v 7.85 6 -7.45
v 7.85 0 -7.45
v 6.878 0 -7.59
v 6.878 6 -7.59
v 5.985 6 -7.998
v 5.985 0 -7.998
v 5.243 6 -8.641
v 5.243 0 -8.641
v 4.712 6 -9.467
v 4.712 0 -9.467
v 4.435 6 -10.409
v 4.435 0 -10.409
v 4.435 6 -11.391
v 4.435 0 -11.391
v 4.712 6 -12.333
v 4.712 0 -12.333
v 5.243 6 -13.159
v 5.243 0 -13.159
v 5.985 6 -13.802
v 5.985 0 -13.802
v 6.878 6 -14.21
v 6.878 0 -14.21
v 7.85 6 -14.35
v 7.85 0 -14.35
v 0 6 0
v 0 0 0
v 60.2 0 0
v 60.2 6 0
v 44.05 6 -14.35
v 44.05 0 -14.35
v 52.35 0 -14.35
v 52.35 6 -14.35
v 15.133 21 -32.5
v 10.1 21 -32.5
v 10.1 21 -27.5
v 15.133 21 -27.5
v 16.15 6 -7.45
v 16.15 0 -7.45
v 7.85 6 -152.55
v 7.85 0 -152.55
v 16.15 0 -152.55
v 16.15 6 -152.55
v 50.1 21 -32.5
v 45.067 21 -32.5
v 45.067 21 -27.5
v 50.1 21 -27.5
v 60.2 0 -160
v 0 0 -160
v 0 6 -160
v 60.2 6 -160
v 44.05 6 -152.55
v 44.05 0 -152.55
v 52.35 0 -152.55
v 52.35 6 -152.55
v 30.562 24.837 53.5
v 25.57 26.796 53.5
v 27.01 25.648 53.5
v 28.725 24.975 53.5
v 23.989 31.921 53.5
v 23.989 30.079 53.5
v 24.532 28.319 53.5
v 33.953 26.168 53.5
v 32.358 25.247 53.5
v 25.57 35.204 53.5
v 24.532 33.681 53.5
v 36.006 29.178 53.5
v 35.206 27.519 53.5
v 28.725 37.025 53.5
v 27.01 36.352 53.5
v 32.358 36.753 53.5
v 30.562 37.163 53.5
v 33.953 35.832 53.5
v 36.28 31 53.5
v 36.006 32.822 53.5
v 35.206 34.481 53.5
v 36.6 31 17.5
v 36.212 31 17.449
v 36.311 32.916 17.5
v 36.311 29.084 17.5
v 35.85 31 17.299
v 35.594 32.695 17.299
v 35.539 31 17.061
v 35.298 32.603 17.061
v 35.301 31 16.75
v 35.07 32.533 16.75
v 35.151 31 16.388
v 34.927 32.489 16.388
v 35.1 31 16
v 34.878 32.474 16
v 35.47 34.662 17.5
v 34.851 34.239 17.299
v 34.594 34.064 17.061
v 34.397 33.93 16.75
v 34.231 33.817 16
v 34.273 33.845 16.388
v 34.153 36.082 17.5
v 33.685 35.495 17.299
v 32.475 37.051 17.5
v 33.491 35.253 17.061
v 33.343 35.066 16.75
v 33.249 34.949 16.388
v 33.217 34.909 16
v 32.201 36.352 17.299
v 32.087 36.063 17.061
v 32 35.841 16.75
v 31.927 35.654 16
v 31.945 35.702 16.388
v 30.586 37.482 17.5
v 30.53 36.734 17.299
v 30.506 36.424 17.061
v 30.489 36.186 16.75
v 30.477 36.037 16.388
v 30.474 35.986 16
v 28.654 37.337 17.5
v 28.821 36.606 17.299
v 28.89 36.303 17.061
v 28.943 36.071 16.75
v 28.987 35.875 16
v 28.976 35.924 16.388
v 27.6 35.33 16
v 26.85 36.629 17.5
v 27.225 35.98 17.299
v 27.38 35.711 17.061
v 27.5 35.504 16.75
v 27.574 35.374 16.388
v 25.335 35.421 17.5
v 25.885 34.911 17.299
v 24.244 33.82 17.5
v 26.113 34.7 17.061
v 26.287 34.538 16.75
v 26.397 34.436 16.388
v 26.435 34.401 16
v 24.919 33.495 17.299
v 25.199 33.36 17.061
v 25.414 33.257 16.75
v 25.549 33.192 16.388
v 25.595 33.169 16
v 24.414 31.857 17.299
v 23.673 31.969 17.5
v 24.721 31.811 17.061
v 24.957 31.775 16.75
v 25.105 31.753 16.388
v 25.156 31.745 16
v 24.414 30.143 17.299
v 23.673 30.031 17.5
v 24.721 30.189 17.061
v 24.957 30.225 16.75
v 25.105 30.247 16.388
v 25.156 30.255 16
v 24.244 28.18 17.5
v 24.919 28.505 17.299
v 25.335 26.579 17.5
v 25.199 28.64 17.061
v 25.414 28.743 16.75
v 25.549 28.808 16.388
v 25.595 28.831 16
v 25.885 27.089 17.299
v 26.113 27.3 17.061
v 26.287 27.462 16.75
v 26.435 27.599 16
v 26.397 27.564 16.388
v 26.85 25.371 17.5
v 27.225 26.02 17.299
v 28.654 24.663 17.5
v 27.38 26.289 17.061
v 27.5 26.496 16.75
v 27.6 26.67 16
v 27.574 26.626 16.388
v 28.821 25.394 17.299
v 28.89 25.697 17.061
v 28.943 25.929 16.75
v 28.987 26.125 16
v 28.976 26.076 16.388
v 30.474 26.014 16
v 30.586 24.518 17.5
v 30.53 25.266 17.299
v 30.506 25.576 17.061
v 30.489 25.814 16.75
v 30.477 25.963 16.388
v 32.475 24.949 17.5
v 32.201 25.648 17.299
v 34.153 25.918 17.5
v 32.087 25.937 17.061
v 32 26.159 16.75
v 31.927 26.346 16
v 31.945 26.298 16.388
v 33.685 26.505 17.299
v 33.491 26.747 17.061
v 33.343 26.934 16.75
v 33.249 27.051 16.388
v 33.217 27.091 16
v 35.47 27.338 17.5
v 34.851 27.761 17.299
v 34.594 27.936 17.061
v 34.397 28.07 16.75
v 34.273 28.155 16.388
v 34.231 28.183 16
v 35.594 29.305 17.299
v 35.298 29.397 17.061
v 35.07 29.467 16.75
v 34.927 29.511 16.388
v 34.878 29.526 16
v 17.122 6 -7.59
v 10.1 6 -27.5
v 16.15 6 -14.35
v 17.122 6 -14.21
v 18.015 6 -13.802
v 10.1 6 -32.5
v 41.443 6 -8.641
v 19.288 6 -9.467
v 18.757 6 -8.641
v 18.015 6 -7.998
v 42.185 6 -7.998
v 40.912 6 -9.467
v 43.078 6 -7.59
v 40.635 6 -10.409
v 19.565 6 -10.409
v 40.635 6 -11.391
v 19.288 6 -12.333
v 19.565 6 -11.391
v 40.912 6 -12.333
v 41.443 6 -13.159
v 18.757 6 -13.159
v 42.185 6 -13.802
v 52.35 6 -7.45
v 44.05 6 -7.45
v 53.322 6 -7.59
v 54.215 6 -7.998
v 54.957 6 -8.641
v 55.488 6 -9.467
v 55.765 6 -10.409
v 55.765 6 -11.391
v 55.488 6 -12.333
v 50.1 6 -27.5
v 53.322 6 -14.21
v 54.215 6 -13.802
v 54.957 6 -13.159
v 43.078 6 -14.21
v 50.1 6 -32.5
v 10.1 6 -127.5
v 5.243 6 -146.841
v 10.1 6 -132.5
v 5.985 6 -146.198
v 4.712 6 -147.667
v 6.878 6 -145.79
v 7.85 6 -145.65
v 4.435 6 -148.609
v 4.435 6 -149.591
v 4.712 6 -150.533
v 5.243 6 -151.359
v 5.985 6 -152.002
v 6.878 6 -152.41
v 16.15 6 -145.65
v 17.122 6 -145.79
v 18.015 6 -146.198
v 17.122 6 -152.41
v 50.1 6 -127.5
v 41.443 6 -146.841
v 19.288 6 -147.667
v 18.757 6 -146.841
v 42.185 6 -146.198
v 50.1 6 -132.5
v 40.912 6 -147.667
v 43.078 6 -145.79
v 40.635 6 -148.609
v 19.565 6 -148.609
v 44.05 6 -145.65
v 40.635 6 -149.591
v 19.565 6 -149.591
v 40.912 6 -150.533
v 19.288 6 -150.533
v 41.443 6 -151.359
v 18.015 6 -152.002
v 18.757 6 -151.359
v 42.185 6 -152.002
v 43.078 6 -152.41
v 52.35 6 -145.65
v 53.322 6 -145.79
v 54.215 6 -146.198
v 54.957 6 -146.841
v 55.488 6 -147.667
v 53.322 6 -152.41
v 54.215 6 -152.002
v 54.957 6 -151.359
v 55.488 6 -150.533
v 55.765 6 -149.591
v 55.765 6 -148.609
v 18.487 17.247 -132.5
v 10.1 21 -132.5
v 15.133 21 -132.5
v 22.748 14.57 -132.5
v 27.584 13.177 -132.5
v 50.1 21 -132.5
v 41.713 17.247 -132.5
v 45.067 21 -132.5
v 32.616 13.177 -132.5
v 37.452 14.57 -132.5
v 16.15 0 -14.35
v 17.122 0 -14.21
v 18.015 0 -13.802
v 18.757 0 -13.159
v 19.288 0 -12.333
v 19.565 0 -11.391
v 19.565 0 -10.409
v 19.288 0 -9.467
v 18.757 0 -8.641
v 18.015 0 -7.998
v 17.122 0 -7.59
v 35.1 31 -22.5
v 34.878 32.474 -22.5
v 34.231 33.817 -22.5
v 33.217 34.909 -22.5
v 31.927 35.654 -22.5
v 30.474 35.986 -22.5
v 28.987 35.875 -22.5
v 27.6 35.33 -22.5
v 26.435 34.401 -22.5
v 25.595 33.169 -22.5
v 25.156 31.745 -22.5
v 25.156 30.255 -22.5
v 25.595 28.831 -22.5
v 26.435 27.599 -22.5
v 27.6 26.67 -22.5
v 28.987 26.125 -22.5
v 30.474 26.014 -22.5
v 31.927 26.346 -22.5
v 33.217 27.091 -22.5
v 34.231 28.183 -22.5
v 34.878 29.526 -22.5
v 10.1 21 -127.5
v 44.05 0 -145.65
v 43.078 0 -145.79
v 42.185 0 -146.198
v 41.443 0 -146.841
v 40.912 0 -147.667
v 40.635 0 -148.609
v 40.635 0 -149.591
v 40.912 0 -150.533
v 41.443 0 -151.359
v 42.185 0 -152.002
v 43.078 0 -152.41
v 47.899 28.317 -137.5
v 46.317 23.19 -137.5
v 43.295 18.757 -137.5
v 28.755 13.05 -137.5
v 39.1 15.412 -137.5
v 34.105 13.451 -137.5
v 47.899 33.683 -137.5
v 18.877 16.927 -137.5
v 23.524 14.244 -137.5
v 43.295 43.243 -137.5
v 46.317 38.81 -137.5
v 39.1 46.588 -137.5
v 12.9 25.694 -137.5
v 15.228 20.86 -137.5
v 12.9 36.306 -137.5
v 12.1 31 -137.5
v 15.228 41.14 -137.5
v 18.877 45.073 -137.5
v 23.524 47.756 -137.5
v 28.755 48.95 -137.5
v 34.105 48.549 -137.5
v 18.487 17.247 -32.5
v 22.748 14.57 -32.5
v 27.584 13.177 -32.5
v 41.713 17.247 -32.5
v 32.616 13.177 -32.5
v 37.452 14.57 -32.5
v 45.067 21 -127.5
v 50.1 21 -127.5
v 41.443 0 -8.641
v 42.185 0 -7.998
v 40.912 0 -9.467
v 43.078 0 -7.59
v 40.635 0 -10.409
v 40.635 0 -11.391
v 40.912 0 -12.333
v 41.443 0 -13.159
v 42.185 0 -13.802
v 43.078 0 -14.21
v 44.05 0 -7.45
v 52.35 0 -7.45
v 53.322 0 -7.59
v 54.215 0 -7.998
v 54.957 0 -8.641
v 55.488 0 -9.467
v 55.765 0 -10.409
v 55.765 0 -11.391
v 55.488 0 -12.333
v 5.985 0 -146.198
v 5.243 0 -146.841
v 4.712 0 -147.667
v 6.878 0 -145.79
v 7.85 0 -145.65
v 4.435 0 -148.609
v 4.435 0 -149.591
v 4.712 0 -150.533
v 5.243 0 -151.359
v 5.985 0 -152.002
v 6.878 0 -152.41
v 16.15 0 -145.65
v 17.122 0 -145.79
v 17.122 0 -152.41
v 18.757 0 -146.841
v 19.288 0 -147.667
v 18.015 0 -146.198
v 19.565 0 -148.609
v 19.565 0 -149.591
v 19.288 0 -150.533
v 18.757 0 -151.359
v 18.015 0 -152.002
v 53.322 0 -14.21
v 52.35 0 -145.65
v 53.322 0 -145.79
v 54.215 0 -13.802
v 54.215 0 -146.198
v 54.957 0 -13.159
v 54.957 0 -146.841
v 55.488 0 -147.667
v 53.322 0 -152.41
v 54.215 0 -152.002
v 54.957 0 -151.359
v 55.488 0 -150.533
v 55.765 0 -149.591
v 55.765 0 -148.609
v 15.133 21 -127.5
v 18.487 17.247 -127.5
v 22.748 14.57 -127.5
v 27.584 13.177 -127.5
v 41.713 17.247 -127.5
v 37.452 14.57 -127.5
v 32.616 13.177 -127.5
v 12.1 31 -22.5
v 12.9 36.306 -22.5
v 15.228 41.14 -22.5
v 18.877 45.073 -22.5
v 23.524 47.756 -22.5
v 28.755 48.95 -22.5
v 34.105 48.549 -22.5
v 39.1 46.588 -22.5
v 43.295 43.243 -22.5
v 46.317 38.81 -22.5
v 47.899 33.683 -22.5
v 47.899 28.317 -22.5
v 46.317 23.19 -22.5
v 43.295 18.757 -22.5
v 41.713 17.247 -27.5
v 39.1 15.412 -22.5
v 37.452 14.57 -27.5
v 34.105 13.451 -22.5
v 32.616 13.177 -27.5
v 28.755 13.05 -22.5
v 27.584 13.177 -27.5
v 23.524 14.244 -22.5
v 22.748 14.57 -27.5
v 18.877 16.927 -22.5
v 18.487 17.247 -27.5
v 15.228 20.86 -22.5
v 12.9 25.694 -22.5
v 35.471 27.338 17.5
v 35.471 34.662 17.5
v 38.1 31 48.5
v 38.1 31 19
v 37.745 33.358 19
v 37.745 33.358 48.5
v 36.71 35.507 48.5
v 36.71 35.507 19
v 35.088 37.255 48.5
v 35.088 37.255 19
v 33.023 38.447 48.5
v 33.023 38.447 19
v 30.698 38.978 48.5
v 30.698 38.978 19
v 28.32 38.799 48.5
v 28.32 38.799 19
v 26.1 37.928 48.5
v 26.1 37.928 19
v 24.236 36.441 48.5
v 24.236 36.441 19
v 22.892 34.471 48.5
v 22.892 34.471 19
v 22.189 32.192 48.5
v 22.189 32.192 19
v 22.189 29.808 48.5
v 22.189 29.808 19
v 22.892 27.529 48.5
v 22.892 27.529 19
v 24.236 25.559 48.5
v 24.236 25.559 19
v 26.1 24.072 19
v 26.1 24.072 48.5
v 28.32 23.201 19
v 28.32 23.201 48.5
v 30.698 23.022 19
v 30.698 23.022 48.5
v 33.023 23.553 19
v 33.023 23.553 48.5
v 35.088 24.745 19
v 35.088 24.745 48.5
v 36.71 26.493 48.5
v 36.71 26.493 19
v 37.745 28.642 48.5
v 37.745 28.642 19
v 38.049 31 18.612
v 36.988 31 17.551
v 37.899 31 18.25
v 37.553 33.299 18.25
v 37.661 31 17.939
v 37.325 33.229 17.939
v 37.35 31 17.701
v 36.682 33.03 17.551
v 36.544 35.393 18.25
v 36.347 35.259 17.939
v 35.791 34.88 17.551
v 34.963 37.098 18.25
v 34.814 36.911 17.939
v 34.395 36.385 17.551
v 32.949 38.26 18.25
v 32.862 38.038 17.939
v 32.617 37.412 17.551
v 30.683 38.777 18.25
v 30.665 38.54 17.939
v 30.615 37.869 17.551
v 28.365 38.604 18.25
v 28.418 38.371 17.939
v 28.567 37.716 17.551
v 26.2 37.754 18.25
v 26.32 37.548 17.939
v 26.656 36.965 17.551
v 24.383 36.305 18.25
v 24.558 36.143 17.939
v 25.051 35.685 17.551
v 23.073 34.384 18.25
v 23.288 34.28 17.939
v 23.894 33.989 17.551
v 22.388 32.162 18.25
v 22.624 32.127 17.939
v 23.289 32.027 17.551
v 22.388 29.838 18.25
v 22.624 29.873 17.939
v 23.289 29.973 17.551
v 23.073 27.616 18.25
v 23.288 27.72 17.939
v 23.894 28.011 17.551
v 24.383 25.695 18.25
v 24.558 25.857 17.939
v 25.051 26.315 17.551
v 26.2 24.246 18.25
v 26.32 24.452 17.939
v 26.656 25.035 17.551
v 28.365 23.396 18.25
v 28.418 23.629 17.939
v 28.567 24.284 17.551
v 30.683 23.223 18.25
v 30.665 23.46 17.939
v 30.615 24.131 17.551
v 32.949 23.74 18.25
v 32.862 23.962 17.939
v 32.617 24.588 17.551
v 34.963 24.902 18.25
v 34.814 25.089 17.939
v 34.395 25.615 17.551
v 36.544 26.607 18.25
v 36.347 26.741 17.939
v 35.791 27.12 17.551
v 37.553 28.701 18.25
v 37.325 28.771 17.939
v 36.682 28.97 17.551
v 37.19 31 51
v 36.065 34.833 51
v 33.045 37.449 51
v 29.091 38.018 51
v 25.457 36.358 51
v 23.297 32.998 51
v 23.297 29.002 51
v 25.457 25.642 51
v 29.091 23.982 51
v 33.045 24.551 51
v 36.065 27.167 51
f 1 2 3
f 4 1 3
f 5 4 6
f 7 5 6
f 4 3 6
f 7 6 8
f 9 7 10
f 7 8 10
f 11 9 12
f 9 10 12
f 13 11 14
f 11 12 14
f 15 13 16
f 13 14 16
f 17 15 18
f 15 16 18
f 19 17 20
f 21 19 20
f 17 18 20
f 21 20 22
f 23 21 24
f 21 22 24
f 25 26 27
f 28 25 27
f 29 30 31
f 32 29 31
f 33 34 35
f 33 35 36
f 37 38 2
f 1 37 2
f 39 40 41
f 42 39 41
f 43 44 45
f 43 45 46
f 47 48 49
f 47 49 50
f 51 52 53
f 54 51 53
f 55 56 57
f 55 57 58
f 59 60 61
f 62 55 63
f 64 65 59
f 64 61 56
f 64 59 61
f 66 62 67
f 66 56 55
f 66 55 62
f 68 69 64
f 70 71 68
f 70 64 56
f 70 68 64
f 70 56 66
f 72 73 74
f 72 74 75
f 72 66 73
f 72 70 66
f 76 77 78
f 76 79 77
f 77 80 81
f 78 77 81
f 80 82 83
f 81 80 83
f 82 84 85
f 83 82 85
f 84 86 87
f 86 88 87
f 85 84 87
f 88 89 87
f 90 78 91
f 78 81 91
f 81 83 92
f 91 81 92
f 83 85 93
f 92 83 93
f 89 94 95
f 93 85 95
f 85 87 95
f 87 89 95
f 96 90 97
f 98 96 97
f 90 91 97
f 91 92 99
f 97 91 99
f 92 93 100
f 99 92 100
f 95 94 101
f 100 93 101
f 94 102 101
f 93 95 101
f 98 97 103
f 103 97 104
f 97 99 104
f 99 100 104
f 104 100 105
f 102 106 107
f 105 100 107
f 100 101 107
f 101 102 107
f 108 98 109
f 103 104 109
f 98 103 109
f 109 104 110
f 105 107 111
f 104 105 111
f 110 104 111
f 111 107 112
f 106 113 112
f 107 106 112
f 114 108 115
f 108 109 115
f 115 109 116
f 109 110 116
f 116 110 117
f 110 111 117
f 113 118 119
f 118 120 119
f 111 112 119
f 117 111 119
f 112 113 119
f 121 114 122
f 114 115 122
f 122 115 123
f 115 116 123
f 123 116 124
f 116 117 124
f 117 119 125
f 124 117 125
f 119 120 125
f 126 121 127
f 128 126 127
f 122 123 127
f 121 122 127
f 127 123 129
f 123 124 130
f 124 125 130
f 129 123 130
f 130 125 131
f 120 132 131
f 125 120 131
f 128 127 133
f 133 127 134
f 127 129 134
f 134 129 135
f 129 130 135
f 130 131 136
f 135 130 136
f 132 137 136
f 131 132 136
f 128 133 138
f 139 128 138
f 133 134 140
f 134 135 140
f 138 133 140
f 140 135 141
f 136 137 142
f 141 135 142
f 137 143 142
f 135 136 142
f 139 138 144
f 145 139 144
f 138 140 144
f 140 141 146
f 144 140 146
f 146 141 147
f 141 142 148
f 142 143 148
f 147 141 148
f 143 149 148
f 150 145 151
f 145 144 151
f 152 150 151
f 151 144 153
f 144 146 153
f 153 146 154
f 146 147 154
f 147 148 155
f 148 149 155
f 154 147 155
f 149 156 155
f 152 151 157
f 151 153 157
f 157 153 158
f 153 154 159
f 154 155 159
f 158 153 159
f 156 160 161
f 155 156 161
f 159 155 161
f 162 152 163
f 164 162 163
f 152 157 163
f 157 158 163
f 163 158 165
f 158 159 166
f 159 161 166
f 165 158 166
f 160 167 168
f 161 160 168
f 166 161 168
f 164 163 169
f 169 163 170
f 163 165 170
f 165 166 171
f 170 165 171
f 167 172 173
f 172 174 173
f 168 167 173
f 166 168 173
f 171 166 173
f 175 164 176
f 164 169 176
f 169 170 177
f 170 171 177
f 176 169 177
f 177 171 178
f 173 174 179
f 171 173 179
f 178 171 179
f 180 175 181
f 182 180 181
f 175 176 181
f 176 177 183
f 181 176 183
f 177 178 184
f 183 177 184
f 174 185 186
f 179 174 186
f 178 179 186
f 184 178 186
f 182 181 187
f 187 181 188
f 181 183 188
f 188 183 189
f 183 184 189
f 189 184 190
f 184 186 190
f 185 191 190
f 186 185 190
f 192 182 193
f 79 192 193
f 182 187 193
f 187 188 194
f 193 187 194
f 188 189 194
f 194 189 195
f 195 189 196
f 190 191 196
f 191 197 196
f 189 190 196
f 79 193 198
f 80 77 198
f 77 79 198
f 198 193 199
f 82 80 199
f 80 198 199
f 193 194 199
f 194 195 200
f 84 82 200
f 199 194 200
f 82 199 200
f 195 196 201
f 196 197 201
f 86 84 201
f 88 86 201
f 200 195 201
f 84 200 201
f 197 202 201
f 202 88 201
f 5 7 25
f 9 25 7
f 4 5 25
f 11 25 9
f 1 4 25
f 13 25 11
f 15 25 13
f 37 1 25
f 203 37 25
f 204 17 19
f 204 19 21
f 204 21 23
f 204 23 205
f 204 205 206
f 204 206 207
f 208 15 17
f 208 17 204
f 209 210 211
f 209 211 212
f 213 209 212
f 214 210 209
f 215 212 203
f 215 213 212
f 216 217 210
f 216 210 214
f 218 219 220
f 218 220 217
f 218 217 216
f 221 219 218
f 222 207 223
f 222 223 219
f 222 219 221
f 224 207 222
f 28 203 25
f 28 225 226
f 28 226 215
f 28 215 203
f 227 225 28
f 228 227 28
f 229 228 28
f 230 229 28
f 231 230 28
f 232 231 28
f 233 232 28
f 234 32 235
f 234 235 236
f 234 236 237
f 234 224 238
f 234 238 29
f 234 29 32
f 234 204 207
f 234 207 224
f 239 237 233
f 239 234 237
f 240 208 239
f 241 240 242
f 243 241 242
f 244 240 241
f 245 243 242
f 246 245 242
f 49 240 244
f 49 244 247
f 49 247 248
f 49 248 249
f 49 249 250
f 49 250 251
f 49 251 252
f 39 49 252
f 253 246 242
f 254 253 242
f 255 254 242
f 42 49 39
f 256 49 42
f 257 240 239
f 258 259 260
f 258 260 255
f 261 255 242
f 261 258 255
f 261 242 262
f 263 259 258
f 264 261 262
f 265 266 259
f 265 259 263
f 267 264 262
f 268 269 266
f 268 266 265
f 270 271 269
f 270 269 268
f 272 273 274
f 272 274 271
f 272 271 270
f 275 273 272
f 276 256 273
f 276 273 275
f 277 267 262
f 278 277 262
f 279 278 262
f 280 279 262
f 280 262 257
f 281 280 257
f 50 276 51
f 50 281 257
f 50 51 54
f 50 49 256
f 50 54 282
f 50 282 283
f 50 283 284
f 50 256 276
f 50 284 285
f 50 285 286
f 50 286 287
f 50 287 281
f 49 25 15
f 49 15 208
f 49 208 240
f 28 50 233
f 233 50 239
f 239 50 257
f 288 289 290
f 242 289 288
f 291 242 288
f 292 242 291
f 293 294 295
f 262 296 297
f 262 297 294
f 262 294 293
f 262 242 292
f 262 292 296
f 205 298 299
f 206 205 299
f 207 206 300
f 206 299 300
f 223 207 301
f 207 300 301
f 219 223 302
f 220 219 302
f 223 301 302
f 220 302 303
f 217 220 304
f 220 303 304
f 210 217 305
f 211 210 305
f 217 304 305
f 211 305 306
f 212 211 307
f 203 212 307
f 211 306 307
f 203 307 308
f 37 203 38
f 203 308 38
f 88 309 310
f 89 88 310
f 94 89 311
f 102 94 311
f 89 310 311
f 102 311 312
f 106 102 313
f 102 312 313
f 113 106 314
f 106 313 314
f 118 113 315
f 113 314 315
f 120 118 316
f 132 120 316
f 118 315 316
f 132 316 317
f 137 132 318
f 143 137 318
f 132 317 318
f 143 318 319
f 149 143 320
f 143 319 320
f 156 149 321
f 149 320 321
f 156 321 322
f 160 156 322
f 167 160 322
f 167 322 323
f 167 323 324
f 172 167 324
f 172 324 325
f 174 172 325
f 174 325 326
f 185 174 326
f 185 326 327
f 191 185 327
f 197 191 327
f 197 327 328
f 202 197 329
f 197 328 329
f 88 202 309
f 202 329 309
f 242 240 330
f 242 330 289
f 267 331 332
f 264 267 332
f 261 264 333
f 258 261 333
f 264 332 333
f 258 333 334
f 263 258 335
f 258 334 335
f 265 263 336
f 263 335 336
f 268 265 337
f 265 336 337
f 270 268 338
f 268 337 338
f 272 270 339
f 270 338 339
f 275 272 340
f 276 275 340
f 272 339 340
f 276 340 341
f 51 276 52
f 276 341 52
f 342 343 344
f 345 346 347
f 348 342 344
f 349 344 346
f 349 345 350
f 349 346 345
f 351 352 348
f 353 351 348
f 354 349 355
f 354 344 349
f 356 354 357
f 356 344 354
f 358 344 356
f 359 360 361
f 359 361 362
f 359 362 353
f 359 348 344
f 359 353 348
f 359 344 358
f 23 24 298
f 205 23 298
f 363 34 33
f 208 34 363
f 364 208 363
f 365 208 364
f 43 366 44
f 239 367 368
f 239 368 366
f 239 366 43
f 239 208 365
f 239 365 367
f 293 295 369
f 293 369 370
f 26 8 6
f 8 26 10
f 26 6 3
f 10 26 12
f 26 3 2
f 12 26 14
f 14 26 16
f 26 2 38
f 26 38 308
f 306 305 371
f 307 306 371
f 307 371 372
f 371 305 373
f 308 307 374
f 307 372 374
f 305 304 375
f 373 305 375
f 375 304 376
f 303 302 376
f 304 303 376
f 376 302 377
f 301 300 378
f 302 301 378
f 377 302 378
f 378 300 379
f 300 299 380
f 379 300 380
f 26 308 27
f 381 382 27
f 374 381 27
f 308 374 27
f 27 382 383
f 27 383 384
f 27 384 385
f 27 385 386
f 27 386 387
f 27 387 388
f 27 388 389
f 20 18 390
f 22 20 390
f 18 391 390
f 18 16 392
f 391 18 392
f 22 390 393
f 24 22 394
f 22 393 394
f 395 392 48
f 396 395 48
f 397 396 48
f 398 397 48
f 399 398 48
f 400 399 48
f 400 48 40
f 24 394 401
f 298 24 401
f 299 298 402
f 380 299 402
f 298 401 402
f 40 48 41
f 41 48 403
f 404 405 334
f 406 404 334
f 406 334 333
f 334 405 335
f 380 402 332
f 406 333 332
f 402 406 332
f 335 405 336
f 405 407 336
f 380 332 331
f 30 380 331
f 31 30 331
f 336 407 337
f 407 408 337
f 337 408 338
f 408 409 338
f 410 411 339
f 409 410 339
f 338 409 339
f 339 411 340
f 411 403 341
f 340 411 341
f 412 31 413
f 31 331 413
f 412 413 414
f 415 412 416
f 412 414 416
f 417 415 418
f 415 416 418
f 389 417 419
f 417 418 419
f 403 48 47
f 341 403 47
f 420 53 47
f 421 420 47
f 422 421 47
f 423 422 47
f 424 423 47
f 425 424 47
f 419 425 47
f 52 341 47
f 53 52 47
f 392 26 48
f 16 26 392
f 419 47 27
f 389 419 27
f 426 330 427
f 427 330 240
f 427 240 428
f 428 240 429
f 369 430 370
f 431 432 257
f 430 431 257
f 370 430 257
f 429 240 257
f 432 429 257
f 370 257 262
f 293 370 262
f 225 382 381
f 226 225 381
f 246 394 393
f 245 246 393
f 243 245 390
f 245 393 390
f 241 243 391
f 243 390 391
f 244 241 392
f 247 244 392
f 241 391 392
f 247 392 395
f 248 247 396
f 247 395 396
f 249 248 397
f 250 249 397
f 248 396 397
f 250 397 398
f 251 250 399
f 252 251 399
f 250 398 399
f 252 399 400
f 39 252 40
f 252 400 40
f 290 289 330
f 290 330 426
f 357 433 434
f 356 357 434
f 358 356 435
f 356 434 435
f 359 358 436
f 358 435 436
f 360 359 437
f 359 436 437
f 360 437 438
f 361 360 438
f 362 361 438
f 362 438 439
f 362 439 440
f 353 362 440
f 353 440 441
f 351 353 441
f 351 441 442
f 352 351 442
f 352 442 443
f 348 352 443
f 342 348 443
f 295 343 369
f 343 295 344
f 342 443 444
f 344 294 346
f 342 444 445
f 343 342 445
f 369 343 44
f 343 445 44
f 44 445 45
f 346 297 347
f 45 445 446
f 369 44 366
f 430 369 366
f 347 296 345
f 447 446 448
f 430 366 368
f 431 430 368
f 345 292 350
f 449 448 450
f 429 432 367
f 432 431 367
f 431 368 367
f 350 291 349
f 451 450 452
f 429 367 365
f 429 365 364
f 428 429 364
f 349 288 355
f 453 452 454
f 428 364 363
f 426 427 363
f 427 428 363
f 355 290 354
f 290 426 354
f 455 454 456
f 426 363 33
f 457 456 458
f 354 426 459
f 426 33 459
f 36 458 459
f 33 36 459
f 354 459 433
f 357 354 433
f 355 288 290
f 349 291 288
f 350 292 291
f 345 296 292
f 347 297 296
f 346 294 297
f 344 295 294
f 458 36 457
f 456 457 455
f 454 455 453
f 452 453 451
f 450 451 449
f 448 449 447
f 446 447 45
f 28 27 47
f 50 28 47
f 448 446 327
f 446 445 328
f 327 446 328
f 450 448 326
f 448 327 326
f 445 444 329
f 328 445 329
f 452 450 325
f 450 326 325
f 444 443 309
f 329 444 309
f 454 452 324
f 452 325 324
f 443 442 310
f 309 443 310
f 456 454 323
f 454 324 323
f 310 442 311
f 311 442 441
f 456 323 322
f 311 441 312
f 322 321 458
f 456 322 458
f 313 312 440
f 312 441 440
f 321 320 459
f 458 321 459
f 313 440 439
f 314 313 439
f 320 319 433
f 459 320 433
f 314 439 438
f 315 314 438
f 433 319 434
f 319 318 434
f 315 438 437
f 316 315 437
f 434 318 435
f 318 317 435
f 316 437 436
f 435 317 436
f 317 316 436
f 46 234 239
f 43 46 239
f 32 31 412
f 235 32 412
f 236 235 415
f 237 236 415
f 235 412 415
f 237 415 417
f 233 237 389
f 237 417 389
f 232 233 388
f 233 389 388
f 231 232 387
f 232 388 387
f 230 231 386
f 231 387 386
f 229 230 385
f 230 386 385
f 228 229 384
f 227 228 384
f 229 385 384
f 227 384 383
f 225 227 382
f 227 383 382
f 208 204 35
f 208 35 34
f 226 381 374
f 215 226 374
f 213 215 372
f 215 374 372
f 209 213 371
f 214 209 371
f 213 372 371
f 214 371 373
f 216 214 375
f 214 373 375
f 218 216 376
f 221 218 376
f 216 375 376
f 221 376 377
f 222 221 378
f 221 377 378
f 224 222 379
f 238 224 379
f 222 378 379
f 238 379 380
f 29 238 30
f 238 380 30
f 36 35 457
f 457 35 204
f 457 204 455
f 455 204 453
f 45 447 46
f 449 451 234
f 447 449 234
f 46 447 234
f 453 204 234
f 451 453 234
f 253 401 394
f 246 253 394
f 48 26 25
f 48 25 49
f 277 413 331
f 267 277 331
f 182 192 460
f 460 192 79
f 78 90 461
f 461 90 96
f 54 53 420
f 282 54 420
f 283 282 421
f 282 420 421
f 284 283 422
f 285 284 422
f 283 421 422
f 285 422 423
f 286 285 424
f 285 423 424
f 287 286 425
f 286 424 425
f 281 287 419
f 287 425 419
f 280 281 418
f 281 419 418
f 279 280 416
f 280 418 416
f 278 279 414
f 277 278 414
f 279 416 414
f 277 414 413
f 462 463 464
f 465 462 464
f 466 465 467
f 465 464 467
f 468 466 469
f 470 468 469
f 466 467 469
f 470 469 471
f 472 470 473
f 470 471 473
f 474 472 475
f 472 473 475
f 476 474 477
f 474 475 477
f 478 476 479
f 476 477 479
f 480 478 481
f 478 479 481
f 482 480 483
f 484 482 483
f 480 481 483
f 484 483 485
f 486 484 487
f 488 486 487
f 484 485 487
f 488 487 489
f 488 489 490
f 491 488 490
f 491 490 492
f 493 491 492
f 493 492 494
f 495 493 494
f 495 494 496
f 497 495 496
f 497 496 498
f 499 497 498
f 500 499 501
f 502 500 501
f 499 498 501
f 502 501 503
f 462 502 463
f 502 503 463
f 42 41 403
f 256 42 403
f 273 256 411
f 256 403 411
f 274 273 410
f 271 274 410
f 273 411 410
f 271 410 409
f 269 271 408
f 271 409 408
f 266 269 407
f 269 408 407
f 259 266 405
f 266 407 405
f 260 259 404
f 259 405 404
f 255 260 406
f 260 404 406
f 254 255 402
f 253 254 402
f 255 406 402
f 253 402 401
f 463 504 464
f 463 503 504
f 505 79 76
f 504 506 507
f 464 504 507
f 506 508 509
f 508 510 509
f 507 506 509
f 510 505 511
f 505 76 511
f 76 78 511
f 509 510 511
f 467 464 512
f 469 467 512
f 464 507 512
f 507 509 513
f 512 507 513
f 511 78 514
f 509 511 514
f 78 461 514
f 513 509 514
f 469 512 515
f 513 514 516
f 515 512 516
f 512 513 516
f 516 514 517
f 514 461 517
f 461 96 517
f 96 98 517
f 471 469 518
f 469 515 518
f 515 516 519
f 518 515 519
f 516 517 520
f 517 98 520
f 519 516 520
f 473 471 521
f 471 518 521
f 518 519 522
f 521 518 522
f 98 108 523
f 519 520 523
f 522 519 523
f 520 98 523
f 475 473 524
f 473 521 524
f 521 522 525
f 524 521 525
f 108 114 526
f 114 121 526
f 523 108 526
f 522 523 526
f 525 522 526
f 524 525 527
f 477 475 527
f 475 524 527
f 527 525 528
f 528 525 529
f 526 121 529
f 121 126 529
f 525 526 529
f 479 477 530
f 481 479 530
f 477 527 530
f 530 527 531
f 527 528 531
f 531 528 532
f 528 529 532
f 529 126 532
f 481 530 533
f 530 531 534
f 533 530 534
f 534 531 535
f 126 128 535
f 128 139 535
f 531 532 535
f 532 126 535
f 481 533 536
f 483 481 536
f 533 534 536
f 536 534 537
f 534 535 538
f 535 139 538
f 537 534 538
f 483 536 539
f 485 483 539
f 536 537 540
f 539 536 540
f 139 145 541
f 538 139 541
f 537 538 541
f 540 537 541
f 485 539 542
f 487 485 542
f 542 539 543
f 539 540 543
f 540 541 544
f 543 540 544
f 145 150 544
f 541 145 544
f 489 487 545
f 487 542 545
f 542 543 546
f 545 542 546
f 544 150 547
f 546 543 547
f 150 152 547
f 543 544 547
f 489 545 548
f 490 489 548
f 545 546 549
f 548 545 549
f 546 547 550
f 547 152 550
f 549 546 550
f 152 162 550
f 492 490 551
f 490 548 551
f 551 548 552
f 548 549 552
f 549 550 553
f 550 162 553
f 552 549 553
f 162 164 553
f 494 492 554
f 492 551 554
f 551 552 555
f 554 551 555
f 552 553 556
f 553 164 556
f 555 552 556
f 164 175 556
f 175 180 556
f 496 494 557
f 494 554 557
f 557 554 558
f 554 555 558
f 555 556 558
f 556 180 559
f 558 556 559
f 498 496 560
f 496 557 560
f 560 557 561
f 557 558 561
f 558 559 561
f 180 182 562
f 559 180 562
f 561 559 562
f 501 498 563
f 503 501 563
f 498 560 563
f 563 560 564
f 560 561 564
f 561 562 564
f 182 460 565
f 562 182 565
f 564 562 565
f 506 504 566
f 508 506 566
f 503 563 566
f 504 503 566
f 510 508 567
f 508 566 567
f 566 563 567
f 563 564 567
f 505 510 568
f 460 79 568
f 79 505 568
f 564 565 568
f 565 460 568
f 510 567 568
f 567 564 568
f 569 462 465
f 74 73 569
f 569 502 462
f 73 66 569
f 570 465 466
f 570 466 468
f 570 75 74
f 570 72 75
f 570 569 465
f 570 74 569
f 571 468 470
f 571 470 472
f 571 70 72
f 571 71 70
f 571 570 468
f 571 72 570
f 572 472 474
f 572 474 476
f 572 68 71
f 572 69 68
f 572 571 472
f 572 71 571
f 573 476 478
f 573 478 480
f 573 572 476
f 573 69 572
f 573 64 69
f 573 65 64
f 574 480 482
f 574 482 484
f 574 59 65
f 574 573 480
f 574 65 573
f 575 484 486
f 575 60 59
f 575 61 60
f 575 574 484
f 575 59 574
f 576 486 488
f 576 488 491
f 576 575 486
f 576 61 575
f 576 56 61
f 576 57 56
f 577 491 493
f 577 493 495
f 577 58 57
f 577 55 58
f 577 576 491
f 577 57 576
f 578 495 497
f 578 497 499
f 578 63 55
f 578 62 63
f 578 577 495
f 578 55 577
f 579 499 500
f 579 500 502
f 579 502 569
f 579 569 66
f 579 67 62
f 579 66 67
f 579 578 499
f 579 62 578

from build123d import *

# Parameters (mm, degrees)
SKETCH1_W                = 60.2
SKETCH1_H                = 160
BOSS_EXTRUDE1_DEPTH      = 6
SKETCH3_W                = 40
SKETCH3_H                = 5
BOSS_EXTRUDE2_DEPTH      = 15
BOSS_EXTRUDE3_DEPTH      = 5
BOSS_EXTRUDE3_DEPTH_BACK = 110
SKETCH4_R                = 18
SKETCH5_R                = 5
BOSS_EXTRUDE4_DEPTH      = 40
SKETCH6_R                = 8
BOSS_EXTRUDE5_DEPTH      = 36
CHAMFER1_SIZE            = 5
CHAMFER1_SIZE2           = 1.819851171
FILLET1_R                = 1.5


with BuildPart() as part:
    # Sketch1 → Boss-Extrude1 (new body)
    with BuildSketch(Plane(origin=(0, 0, 0), x_dir=(1, 0, 0), z_dir=(0, 1, 0))):
        with Locations((30.1, 80)):
            Rectangle(SKETCH1_W, SKETCH1_H)
        with BuildLine():
            Line((7.85, 152.55), (16.15, 152.55))
            ThreePointArc((16.15, 152.55), (19.6, 149.1), (16.15, 145.65))
            Line((16.15, 145.65), (7.85, 145.65))
            ThreePointArc((7.85, 145.65), (4.4, 149.1), (7.85, 152.55))
        make_face(mode=Mode.SUBTRACT)
        with BuildLine():
            Line((52.35, 145.65), (44.05, 145.65))
            ThreePointArc((44.05, 145.65), (40.6, 149.1), (44.05, 152.55))
            Line((44.05, 152.55), (52.35, 152.55))
            ThreePointArc((52.35, 152.55), (55.8, 149.1), (52.35, 145.65))
        make_face(mode=Mode.SUBTRACT)
        with BuildLine():
            Line((52.35, 7.45), (44.05, 7.45))
            ThreePointArc((44.05, 7.45), (40.6, 10.9), (44.05, 14.35))
            Line((44.05, 14.35), (52.35, 14.35))
            ThreePointArc((52.35, 14.35), (55.8, 10.9), (52.35, 7.45))
        make_face(mode=Mode.SUBTRACT)
        with BuildLine():
            Line((7.85, 14.35), (16.15, 14.35))
            ThreePointArc((16.15, 14.35), (19.6, 10.9), (16.15, 7.45))
            Line((16.15, 7.45), (7.85, 7.45))
            ThreePointArc((7.85, 7.45), (4.4, 10.9), (7.85, 14.35))
        make_face(mode=Mode.SUBTRACT)
    extrude(amount=BOSS_EXTRUDE1_DEPTH)

    # Sketch3 → Boss-Extrude2 (add)
    with BuildSketch(Plane(origin=(0, 6, 0), x_dir=(1, 0, 0), z_dir=(0, 1, 0))):
        with Locations((30.1, 130)):
            Rectangle(SKETCH3_W, SKETCH3_H)
        with Locations((30.1, 30)):
            Rectangle(SKETCH3_W, SKETCH3_H)
    extrude(amount=BOSS_EXTRUDE2_DEPTH)

    # Sketch4 → Boss-Extrude3 (add, two sides: drawn at the far end of the back side and taken through both)
    with BuildSketch(Plane(origin=(0, 0, -132.5), x_dir=(-1, 0, 0), z_dir=(0, 0, -1)).offset(-BOSS_EXTRUDE3_DEPTH_BACK)):
        with Locations((-30.1, 31)):
            Circle(SKETCH4_R)
    extrude(amount=BOSS_EXTRUDE3_DEPTH + BOSS_EXTRUDE3_DEPTH_BACK)

    # Sketch5 → Boss-Extrude4 (add)
    with BuildSketch(Plane.XY.offset(-22.5)):
        with Locations((30.1, 31)):
            Circle(SKETCH5_R)
    extrude(amount=BOSS_EXTRUDE4_DEPTH)

    # Sketch6 → Boss-Extrude5 (add)
    with BuildSketch(Plane.XY.offset(17.5)):
        with Locations((30.1, 31)):
            Circle(SKETCH6_R)
    extrude(amount=BOSS_EXTRUDE5_DEPTH)

    # Chamfer1
    chamfer1_edges = [part.edges().sort_by_distance(p)[0] for p in [
        (22.1, 31, 53.5),
    ]]
    chamfer1_side = [part.faces().sort_by_distance(p)[0] for p in [
        (22.1, 31, 35.5),
    ]]
    chamfer(chamfer1_edges, length=CHAMFER1_SIZE, length2=CHAMFER1_SIZE2, reference=chamfer1_side[0])

    # Fillet1
    fillet1_edges = [part.edges().sort_by_distance(p)[0] for p in [
        (25.1, 31, 17.5),
        (22.1, 31, 17.5),
    ]]
    fillet(fillet1_edges, radius=FILLET1_R - 0.0001)  # a hair under: the kernel refuses the full size


solid = part.part
